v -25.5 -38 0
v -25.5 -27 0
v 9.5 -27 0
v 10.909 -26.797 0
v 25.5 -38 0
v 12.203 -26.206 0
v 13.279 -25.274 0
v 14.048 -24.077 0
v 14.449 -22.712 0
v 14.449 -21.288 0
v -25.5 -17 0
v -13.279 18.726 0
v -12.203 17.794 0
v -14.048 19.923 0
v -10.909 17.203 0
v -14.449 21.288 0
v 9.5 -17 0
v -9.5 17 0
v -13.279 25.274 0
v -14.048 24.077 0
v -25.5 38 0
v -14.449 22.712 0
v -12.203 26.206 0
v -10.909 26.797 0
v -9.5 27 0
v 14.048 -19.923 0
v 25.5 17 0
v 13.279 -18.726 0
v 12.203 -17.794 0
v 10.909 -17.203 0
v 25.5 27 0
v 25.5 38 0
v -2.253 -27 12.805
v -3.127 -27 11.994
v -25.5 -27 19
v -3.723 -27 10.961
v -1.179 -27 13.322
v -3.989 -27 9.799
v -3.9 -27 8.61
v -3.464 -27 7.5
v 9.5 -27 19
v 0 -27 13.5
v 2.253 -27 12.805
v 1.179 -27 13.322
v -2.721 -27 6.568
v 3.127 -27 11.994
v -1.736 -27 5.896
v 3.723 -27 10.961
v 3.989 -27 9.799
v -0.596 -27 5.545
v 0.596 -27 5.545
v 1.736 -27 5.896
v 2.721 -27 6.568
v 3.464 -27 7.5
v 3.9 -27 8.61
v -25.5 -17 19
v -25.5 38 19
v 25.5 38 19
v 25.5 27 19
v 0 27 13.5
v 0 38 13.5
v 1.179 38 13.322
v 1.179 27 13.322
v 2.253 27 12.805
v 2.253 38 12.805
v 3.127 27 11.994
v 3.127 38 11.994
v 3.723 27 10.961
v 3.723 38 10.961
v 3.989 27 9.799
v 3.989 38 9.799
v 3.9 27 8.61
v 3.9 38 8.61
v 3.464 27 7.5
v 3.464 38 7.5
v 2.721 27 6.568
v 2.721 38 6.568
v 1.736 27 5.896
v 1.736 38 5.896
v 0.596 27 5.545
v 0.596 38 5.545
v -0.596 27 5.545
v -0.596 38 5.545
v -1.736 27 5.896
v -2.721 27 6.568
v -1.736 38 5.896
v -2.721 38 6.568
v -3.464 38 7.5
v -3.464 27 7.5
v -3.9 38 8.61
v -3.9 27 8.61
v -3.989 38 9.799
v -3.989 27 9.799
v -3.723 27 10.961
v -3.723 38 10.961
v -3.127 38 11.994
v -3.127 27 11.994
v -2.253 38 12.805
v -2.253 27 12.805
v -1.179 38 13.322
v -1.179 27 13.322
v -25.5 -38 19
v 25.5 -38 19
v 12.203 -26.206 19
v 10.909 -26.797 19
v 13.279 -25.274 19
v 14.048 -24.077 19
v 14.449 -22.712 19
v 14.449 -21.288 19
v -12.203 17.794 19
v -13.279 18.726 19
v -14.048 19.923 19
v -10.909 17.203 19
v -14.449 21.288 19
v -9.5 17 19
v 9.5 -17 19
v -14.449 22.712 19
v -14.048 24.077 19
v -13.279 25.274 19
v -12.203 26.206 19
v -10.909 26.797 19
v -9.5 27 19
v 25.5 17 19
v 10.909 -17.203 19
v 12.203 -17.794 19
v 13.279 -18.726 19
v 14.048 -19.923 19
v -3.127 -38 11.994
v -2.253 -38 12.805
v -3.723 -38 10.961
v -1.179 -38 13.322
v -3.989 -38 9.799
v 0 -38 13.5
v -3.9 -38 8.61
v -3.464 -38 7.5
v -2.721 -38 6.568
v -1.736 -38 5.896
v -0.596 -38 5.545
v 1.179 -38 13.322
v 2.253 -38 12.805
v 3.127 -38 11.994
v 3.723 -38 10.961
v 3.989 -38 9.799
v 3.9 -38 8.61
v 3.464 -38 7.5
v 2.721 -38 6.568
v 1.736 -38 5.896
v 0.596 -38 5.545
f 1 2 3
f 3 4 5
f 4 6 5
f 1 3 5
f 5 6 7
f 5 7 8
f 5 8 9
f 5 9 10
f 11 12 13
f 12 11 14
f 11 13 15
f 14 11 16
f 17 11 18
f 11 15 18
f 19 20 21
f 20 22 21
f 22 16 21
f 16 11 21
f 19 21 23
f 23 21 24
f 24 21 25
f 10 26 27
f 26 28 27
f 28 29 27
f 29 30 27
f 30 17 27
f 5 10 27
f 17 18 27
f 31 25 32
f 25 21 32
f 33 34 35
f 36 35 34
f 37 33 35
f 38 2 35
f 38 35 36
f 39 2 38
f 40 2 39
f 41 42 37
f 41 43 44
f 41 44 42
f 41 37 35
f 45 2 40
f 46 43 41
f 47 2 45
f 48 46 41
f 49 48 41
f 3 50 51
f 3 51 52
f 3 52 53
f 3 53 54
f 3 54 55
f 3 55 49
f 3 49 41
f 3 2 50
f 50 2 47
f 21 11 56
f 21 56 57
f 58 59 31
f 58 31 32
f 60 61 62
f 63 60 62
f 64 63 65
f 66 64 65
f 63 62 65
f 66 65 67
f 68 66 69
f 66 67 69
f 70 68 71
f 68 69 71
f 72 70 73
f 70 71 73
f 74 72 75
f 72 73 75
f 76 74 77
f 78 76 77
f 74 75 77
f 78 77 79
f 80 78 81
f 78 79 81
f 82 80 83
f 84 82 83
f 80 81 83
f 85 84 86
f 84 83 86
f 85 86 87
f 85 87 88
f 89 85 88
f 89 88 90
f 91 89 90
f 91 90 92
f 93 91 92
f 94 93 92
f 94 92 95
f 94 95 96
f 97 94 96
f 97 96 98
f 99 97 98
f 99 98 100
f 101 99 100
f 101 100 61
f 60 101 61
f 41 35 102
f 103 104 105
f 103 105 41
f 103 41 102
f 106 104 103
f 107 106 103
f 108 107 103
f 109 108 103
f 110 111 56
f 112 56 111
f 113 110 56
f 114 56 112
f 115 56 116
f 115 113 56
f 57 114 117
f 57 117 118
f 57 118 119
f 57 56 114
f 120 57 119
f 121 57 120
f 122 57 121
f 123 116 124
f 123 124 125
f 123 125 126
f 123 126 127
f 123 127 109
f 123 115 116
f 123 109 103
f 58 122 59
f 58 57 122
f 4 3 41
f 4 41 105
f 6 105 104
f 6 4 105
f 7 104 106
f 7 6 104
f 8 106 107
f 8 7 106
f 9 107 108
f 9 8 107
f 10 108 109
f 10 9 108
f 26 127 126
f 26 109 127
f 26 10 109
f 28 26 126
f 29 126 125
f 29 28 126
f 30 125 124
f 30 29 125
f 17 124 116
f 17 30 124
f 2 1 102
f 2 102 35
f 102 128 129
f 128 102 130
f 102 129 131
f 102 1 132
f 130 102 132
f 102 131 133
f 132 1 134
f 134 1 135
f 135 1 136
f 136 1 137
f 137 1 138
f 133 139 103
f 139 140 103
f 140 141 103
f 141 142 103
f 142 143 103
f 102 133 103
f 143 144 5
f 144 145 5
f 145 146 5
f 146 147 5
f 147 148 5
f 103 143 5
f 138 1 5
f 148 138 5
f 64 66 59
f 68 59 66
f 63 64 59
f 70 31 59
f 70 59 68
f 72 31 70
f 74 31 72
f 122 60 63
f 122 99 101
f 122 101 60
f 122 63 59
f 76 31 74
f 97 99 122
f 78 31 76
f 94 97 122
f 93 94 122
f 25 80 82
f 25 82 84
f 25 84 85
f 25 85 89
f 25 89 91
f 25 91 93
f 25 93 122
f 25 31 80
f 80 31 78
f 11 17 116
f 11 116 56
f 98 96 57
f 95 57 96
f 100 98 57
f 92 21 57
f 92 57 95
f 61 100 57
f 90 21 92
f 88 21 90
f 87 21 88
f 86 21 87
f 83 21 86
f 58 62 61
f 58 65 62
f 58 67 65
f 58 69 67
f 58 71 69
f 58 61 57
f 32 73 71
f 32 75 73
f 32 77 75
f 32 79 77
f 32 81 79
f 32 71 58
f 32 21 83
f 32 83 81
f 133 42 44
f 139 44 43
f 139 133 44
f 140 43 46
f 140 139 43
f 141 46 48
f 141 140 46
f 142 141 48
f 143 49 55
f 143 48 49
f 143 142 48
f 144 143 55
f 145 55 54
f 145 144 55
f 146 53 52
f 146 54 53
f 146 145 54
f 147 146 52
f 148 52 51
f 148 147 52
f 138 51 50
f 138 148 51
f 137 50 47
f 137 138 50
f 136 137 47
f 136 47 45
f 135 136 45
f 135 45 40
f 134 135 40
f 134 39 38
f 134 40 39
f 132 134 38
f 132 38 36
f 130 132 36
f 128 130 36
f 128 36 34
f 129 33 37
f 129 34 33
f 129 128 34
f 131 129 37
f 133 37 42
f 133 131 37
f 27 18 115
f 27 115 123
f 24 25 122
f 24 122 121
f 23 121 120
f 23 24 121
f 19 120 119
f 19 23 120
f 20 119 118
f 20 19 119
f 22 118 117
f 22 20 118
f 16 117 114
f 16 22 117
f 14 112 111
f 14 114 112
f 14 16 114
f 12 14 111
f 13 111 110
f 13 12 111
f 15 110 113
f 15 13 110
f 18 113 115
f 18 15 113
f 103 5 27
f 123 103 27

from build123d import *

# Parameters (mm, degrees)
SKETCH_1_W          = 51
SKETCH_1_H          = 76
EXTRUDE_1_DEPTH     = 19
CUT_EXTRUDE_2_DEPTH = 50.550479312
SKETCH_2_R          = 4
CUT_EXTRUDE_1_DEPTH = 19


with BuildPart() as part:
    # 草图1 → 凸台-拉伸1 (new body)
    with BuildSketch(Plane.XY):
        Rectangle(SKETCH_1_W, SKETCH_1_H)
    extrude(amount=EXTRUDE_1_DEPTH)

    # 草图3 → 切除-拉伸2 (cut, through all)
    with BuildSketch(Plane(origin=(0, 0, 0), x_dir=(-1, 0, 0), z_dir=(0, 0, -1))):
        with BuildLine():
            Line((-25.5, 27), (9.5, 27))
            ThreePointArc((9.5, 27), (14.5, 22), (9.5, 17))
            Line((9.5, 17), (-25.5, 17))
            Line((-25.5, 17), (-25.5, 27))
        make_face()
        with BuildLine():
            Line((25.5, -27), (-9.5, -27))
            ThreePointArc((-9.5, -27), (-14.5, -22), (-9.5, -17))
            Line((-9.5, -17), (25.5, -17))
            Line((25.5, -17), (25.5, -27))
        make_face()
    extrude(amount=-CUT_EXTRUDE_2_DEPTH, mode=Mode.SUBTRACT)

    # 草图2 → 切除-拉伸1 (cut)
    with BuildSketch(Plane(origin=(0, 38, 0), x_dir=(1, 0, 0), z_dir=(0, 1, 0))):
        with Locations(Location((0, -9.5, 0), (0, 0, 270))):
            Circle(SKETCH_2_R)
    cut_extrude_1 = extrude(amount=-CUT_EXTRUDE_1_DEPTH, mode=Mode.SUBTRACT)

    # 镜向1: 切除-拉伸1 across plane
    add(cut_extrude_1.mirror(Plane.ZX), mode=Mode.SUBTRACT)


solid = part.part
